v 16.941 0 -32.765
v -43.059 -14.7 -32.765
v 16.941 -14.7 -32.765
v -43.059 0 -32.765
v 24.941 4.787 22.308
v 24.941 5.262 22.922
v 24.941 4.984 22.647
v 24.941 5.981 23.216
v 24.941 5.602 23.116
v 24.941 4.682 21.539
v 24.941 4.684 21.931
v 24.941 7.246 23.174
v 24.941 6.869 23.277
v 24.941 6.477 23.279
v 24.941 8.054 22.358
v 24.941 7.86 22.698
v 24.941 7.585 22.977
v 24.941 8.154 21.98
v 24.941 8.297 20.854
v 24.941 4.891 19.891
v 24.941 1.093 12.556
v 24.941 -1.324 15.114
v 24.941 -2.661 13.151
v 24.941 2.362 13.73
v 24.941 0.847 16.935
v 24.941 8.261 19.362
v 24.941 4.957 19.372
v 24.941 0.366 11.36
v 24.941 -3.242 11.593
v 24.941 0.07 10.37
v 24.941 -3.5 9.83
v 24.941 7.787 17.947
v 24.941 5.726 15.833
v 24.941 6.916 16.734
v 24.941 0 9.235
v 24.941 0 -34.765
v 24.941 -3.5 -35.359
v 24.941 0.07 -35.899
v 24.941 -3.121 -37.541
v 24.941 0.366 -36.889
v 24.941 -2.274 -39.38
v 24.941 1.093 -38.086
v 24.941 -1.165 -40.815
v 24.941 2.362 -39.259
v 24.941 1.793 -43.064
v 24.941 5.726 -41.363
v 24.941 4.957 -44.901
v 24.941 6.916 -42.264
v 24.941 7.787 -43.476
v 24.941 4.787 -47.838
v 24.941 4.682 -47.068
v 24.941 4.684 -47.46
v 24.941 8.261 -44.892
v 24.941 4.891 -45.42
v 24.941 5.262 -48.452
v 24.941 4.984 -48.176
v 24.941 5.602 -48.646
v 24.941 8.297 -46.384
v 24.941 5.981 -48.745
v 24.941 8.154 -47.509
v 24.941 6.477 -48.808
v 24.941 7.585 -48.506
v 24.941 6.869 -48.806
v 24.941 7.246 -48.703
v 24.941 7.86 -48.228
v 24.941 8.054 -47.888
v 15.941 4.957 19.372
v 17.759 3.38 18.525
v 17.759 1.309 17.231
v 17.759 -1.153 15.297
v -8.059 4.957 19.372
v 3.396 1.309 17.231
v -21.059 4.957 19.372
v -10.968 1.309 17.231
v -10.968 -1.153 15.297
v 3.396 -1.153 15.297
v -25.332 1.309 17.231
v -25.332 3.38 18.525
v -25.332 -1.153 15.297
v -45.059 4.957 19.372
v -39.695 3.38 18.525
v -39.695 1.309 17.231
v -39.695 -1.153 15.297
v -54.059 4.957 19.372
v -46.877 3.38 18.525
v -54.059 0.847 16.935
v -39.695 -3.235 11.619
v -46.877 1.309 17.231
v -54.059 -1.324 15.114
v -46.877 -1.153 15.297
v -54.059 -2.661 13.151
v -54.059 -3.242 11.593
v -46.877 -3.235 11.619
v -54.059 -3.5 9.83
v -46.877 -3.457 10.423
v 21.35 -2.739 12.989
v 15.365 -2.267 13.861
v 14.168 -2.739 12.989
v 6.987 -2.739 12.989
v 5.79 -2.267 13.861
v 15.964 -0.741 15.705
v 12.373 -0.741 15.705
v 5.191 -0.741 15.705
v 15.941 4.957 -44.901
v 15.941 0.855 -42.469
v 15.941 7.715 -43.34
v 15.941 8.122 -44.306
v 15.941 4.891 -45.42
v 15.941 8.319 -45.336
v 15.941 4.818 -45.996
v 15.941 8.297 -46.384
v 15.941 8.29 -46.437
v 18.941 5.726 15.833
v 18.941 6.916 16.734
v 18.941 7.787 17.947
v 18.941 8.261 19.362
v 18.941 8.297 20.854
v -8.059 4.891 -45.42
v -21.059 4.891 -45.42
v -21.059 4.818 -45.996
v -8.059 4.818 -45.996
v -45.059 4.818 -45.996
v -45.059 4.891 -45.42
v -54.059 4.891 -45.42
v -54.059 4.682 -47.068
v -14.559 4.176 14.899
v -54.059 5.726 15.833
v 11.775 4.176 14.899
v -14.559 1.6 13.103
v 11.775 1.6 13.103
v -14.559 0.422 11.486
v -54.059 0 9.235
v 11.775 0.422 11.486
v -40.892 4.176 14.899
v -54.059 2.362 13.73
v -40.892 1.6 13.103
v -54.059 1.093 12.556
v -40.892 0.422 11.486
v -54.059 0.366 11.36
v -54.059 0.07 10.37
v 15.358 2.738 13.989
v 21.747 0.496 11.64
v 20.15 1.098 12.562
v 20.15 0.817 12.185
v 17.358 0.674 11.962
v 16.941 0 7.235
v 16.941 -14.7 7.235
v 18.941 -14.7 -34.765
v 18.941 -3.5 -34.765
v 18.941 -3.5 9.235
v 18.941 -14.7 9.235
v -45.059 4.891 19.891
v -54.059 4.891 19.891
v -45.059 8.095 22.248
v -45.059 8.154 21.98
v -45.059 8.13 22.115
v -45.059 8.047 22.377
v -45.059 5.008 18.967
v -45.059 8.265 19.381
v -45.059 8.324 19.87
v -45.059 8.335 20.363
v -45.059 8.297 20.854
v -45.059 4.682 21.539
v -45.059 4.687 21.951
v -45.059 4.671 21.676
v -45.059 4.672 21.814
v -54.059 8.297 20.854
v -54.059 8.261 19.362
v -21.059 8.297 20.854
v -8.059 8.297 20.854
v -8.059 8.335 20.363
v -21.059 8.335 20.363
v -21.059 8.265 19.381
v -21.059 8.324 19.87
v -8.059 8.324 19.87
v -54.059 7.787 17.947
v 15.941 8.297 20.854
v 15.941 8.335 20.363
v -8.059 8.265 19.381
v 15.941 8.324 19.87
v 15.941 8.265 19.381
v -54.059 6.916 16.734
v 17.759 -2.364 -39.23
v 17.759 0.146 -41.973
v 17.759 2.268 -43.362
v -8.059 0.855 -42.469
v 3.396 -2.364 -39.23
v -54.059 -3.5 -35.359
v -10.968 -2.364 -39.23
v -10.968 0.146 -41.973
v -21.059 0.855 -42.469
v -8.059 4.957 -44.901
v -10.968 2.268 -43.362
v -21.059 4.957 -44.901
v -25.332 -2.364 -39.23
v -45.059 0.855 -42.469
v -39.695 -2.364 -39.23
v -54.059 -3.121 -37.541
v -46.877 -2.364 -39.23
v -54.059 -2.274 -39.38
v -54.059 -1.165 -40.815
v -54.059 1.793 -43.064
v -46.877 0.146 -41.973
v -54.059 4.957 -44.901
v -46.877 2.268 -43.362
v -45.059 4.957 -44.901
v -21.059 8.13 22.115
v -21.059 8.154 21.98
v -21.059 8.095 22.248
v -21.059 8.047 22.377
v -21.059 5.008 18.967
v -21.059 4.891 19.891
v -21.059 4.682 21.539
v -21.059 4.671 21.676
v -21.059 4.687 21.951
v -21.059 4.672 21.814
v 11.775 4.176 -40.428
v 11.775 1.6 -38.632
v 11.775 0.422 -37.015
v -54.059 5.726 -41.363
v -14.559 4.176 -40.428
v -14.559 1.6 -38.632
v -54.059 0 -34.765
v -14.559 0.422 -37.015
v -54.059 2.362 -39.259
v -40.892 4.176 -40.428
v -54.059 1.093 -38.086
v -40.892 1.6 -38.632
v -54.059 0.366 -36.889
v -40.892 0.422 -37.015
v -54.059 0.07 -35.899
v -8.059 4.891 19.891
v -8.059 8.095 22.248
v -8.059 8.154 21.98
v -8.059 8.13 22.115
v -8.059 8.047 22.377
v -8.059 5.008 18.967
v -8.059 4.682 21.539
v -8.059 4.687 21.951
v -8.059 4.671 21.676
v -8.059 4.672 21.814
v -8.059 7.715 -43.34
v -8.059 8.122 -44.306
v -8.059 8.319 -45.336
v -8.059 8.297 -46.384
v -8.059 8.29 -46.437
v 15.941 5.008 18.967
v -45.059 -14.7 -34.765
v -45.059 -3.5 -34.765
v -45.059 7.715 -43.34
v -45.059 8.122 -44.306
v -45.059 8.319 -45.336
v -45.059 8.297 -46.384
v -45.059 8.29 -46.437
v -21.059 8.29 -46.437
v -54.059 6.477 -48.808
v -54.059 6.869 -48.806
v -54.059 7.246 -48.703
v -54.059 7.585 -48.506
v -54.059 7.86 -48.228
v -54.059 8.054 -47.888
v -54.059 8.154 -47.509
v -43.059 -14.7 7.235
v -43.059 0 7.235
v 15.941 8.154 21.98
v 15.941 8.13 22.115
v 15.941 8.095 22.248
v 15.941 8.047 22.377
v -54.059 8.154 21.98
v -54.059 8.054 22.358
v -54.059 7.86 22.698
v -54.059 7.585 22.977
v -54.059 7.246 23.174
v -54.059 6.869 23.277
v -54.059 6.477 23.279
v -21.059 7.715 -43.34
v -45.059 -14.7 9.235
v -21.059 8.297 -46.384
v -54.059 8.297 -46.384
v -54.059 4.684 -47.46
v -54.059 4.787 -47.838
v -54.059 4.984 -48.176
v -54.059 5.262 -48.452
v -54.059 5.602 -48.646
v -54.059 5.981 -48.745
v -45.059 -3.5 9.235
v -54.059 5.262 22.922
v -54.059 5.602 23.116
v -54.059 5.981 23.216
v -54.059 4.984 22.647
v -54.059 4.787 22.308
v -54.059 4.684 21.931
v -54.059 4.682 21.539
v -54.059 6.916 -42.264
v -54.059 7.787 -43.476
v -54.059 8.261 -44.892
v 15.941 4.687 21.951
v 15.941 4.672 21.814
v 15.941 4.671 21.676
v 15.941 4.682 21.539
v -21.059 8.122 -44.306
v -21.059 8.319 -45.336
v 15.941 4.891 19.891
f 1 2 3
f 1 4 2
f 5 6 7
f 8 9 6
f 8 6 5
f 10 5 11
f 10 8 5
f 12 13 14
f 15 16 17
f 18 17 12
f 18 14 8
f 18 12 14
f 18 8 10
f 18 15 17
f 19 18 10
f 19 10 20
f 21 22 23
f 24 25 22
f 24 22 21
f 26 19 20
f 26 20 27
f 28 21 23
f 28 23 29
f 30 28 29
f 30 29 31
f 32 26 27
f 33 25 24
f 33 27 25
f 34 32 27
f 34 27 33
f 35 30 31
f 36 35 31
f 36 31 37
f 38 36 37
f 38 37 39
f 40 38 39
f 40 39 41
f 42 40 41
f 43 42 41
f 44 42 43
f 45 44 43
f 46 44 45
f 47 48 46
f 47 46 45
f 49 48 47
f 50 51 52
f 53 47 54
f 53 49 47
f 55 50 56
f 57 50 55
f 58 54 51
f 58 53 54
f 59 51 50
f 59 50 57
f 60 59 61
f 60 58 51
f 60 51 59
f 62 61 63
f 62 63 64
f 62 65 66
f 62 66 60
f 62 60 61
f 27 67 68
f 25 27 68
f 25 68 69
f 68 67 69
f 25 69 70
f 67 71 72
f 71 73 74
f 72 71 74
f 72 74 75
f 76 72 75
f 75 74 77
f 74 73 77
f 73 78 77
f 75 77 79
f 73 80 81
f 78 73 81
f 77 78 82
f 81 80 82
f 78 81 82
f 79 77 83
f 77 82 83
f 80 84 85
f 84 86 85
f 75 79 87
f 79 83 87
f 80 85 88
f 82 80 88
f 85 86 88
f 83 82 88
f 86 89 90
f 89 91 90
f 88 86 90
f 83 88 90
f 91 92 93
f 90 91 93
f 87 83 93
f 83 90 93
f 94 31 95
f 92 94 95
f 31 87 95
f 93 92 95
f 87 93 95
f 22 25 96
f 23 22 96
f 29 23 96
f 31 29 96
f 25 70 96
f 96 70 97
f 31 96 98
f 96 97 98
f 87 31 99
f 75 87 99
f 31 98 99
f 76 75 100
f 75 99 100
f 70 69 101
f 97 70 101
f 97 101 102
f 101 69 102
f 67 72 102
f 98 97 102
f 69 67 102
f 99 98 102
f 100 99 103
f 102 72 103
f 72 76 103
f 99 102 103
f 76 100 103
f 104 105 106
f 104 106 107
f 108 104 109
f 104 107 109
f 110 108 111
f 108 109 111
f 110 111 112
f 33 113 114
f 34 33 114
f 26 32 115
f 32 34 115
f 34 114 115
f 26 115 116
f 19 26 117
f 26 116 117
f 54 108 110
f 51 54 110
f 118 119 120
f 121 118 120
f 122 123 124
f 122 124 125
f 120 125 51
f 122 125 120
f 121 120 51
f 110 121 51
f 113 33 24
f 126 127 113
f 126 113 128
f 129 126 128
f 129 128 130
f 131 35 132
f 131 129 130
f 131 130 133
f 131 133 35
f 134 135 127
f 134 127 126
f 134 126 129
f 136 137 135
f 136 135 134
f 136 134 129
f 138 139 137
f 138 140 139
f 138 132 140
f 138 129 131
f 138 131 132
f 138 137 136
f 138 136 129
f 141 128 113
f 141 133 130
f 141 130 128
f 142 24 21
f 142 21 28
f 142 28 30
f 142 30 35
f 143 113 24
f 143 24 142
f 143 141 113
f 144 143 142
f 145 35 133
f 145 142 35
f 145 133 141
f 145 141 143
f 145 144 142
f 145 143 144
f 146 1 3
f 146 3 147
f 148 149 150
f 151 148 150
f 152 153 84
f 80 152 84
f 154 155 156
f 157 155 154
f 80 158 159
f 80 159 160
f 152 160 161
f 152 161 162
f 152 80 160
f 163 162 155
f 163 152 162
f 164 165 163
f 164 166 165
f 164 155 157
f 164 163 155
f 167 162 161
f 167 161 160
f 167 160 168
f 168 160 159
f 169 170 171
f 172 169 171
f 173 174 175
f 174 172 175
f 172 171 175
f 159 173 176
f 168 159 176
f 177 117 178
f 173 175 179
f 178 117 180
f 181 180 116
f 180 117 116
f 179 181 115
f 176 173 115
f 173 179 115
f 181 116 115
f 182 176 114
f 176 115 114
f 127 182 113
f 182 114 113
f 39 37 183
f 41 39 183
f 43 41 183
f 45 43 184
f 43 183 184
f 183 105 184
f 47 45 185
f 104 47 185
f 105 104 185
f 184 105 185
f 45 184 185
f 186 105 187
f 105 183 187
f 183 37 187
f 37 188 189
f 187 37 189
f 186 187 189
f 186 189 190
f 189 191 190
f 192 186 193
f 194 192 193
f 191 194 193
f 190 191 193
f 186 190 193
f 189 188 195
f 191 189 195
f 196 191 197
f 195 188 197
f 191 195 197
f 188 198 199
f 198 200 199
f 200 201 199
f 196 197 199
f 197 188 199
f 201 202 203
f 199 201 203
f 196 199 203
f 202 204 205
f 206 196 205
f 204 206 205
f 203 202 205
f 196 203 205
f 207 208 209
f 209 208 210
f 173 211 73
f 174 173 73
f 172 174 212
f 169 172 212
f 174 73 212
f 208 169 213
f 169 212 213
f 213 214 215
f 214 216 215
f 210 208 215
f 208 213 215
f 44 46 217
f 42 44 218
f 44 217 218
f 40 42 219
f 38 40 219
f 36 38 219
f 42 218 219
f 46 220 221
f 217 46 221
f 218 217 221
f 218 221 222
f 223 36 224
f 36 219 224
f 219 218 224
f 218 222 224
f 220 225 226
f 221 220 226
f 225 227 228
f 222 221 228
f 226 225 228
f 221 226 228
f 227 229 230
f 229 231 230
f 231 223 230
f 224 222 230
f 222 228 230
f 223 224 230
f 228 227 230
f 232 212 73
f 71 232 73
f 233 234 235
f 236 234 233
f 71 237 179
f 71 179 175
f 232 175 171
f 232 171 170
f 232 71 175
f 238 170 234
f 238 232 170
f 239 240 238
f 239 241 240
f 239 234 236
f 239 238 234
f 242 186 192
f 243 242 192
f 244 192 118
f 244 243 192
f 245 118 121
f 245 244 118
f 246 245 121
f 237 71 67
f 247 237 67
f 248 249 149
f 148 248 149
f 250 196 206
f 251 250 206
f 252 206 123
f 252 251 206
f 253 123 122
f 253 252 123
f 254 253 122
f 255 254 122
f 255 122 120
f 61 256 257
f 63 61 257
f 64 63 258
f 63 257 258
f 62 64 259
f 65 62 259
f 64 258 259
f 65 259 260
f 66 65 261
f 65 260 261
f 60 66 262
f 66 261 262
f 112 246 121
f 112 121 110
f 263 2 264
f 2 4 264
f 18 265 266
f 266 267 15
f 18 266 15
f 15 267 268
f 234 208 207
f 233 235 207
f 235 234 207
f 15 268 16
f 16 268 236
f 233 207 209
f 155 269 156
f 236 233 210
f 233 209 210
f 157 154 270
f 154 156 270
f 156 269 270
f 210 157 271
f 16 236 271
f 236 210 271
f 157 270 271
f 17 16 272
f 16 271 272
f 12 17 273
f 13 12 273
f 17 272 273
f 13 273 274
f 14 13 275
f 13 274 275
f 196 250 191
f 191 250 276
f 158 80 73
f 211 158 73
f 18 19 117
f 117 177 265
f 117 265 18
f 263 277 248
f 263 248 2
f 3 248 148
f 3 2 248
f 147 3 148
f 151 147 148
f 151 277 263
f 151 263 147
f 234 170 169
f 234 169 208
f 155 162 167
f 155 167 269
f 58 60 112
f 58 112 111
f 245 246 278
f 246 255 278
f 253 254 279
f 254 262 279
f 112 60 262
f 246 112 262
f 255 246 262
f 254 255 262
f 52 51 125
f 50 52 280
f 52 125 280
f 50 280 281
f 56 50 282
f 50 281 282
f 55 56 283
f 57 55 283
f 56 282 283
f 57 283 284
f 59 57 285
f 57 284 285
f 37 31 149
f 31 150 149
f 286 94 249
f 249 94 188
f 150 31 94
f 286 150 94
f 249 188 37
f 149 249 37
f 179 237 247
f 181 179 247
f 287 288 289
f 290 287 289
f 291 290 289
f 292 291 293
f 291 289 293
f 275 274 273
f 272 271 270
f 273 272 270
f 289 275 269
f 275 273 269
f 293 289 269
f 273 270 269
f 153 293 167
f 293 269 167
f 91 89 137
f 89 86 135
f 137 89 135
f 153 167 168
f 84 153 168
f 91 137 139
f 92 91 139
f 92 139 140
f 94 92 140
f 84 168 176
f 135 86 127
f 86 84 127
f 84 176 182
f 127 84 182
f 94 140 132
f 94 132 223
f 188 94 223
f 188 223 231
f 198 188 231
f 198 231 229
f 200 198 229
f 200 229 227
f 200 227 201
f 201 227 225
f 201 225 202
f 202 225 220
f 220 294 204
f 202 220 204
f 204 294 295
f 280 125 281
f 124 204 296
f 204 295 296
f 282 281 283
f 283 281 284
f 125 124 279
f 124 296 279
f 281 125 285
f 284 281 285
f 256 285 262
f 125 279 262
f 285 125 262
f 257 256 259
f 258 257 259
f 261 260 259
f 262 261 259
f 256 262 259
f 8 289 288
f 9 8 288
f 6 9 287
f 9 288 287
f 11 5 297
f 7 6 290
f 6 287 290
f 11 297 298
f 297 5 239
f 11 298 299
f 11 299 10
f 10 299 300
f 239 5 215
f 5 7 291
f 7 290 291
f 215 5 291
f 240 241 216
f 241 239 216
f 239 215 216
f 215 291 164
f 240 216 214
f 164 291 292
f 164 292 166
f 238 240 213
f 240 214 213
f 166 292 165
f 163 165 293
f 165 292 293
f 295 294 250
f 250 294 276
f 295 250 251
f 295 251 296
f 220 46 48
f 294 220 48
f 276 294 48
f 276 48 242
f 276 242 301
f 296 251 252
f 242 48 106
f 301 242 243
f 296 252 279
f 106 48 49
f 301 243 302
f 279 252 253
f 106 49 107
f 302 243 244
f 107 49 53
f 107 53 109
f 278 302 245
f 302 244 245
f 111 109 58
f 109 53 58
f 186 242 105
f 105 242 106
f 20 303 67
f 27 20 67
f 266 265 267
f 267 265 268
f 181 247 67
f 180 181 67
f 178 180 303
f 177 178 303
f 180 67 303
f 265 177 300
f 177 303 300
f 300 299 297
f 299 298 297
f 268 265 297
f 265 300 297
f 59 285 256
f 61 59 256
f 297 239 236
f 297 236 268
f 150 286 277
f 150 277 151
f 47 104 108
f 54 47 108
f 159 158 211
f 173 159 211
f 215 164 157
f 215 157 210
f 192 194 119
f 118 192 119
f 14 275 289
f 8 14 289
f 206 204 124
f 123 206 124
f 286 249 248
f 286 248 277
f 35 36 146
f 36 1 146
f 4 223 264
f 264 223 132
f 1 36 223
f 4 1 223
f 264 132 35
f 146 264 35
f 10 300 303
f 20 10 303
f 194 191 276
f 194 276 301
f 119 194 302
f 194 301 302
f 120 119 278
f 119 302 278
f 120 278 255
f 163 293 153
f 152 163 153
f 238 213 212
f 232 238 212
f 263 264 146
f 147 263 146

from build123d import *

# Parameters (mm, degrees)
BOSS_EXTRUDE1_DEPTH      = 6
BOSS_EXTRUDE1_DEPTH_BACK = 73
SKETCH1_W                = 60
SKETCH1_H                = 40
CUT_EXTRUDE2_DEPTH       = 10
SKETCH7_W                = 64
SKETCH7_H                = 44
SKETCH7_W_2              = 60
SKETCH7_H_2              = 40
BOSS_EXTRUDE2_DEPTH      = 11.2
SKETCH5_W                = 24
SKETCH5_H                = 3
CUT_EXTRUDE3_DEPTH       = 11.2
SKETCH8_W                = 24
SKETCH8_H                = 3
CUT_EXTRUDE4_DEPTH       = 11.2
FILLET1_R                = 5


with BuildPart() as part:
    # Sketch2 → Boss-Extrude1 (new, two sides: drawn at the far end of the back side and taken through both)
    with BuildSketch(Plane(origin=(18.941176471, 0, 0), x_dir=(0, 0, -1), z_dir=(1, 0, 0)).offset(-BOSS_EXTRUDE1_DEPTH_BACK)):
        with BuildLine():
            Line((34.764705882, 0), (-9.235294118, 0))
            add(Edge.make_bspline(
                [(-16.859042356, 8.803732274), (-16.71202536, 7.645123783), (-16.476121405, 6.983025742), (-15.665438552, 5.367344471), (-15.146819104, 4.569071681), (-14.219232142, 3.103782941), (-13.097173401, 1.202110064), (-10.958273151, -0.0861532), (-9.235294118, 0)],
                knots=[0.100936793, 0.100936793, 0.100936793, 0.100936793, 0.214701658, 0.247771225, 0.411203439, 0.4591999, 0.679739374, 1, 1, 1, 1], degree=3))
            Line((-16.859042356, 8.803732274), (-20.331201871, 8.363155033))
            Line((-20.331201871, 8.363155033), (-21.979605491, 8.153991509))
            ThreePointArc((-21.979605491, 8.153991509), (-22.976524971, 7.58463131), (-23.278855037, 6.477104328))
            Line((-23.278855037, 6.477104328), (-23.215915431, 5.981081541))
            ThreePointArc((-23.215915431, 5.981081541), (-22.646555232, 4.984162061), (-21.53902825, 4.681831995))
            Line((-21.53902825, 4.681831995), (-19.89062463, 4.890995519))
            Line((-19.89062463, 4.890995519), (-19.371936566, 4.956811088))
            add(Edge.make_bspline(
                [(-19.371936566, 4.956811088), (-19.299083809, 4.805602772), (-19.143543885, 4.495535048), (-18.861030136, 3.961180263), (-18.379944727, 3.117280646), (-17.808764188, 2.238291872), (-17.267901922, 1.360604939), (-16.505554516, 0.170581495), (-15.372861084, -1.167927692), (-13.787032793, -2.419221644), (-12.034516859, -3.186353681), (-10.648338067, -3.44710609), (-10.029136817, -3.492321417), (-9.829873201, -3.5)],
                knots=[0.220066507, 0.220066507, 0.220066507, 0.220066507, 0.244323833, 0.26858116, 0.317095812, 0.414125118, 0.511154423, 0.608183729, 0.705213035, 0.80224234, 0.899271646, 0.947786298, 0.970646745, 0.970646745, 0.970646745, 0.970646745], degree=3))
            Line((-9.829873201, -3.5), (-9.158730941, -3.5))
            Line((-9.158730941, -3.5), (34.688142706, -3.5))
            Line((34.688142706, -3.5), (35.359284966, -3.5))
            add(Edge.make_bspline(
                [(35.359284966, -3.5), (35.558548581, -3.492321417), (36.177749832, -3.44710609), (37.563928624, -3.186353681), (39.316444558, -2.419221644), (40.902272849, -1.167927692), (42.034966281, 0.170581495), (42.797313687, 1.360604939), (43.338175952, 2.238291872), (43.909356491, 3.117280646), (44.390441901, 3.961180263), (44.67295565, 4.495535048), (44.828495573, 4.805602772), (44.901348331, 4.956811088)],
                knots=[0.245720713, 0.245720713, 0.245720713, 0.245720713, 0.26858116, 0.317095812, 0.414125118, 0.511154423, 0.608183729, 0.705213035, 0.80224234, 0.899271646, 0.947786298, 0.972043625, 0.996300951, 0.996300951, 0.996300951, 0.996300951], degree=3))
            Line((44.901348331, 4.956811088), (45.420036395, 4.890995519))
            Line((45.420036395, 4.890995519), (47.068440015, 4.681831995))
            ThreePointArc((47.068440015, 4.681831995), (48.175966997, 4.984162061), (48.745327196, 5.981081541))
            Line((48.745327196, 5.981081541), (48.808266802, 6.477104328))
            ThreePointArc((48.808266802, 6.477104328), (48.505936735, 7.58463131), (47.509017256, 8.153991509))
            Line((47.509017256, 8.153991509), (45.860613636, 8.363155033))
            Line((45.860613636, 8.363155033), (42.388454121, 8.803732274))
            add(Edge.make_bspline(
                [(42.388454121, 8.803732274), (42.241437125, 7.645123783), (42.00553317, 6.983025742), (41.194850317, 5.367344471), (40.676230869, 4.569071681), (39.748643907, 3.103782941), (38.626585166, 1.202110064), (36.487684916, -0.0861532), (34.764705882, 0)],
                knots=[0.100936793, 0.100936793, 0.100936793, 0.100936793, 0.214701658, 0.247771225, 0.411203439, 0.4591999, 0.679739374, 1, 1, 1, 1], degree=3))
        make_face()
    extrude(amount=BOSS_EXTRUDE1_DEPTH + BOSS_EXTRUDE1_DEPTH_BACK)

    # Sketch1 → Cut-Extrude2 (cut)
    with BuildSketch(Plane(origin=(0, 0, 0), x_dir=(1, 0, 0), z_dir=(0, 1, 0))):
        with Locations((-13.058823529, 12.764705882)):
            Rectangle(SKETCH1_W, SKETCH1_H)
    extrude(amount=-CUT_EXTRUDE2_DEPTH, mode=Mode.SUBTRACT)

    # Sketch7 → Boss-Extrude2 (add)
    with BuildSketch(Plane.XZ.offset(3.5)):
        with Locations((-13.058823529, -12.764705882)):
            Rectangle(SKETCH7_W, SKETCH7_H)
        with Locations((-13.058823529, -12.764705882)):
            Rectangle(SKETCH7_W_2, SKETCH7_H_2, mode=Mode.SUBTRACT)
    extrude(amount=BOSS_EXTRUDE2_DEPTH)

    # Sketch5 → Cut-Extrude3 (cut)
    with BuildSketch(Plane(origin=(0, 7.29739461, 0.925955726), x_dir=(1, 0, 0), z_dir=(0, -0.9920455755956746, -0.12587921171125438))):
        with Locations((-33.058823529, 19.686118423)):
            Rectangle(SKETCH5_W, SKETCH5_H)
        with Locations((3.941176471, 19.686118423)):
            Rectangle(SKETCH5_W, SKETCH5_H)
    extrude(amount=-CUT_EXTRUDE3_DEPTH, mode=Mode.SUBTRACT)

    # Sketch8 → Cut-Extrude4 (cut)
    with BuildSketch(Plane(origin=(0, 13.957613838, -1.7710612), x_dir=(1, 0, 0), z_dir=(0, 0.9920455755956736, -0.12587921171126285))):
        with Locations((-33.058823529, 43.523881917)):
            Rectangle(SKETCH8_W, SKETCH8_H)
        with Locations((3.941176471, 43.523881917)):
            Rectangle(SKETCH8_W, SKETCH8_H)
    extrude(amount=-CUT_EXTRUDE4_DEPTH, mode=Mode.SUBTRACT)

    # Fillet1
    # the kernel refuses this fillet: 5 mm, written as the material it takes off along each edge
    with BuildSketch(Plane(origin=(18.941176471, 8.803732274, -42.388454121), x_dir=(0, -0.12587921171125008, -0.9920455755956751), z_dir=(-1, 0, 0))) as fillet1_piece_1:
        with BuildLine():
            CenterArc((4.027488586, 5), FILLET1_R, 201.320916369, 68.679083631)
            Line((-0.6303042, 3.182043355), (-0.723460056, 3.145684222))
            ThreePointArc((-0.723460056, 3.145684222), (-0.228216041, 1.608856089), (-0.1, -2.43e-07))
            Line((-0.1, -2.43e-07), (0, -0.1))
            Line((0, -0.1), (4.027488586, -0.1))
            Line((4.027488586, -0.1), (4.027488586, 0))
        make_face()
    extrude(amount=83.068721464, mode=Mode.SUBTRACT)
    with BuildSketch(Plane(origin=(18.941176471, 8.803732274, 16.859042356), x_dir=(0, -0.12587921171124858, 0.9920455755956752), z_dir=(-1, 0, 0))) as fillet1_piece_2:
        with BuildLine():
            CenterArc((4.027488586, -5), FILLET1_R, 90, 68.679083631)
            Line((-0.6303042, -3.182043355), (-0.723460056, -3.145684222))
            ThreePointArc((-0.723460056, -3.145684222), (-0.228216041, -1.608856089), (-0.1, 2.43e-07))
            Line((-0.1, 2.43e-07), (0, 0.1))
            Line((0, 0.1), (4.027488586, 0.1))
            Line((4.027488586, 0.1), (4.027488586, 0))
        make_face()
    extrude(amount=83.068721464, mode=Mode.SUBTRACT)
    with BuildSketch(Plane(origin=(18.941176471, 8.803732274, 16.859042356), x_dir=(0, -0.948678952181438, -0.31624080332545423), z_dir=(1, 0, 0))) as fillet1_piece_3:
        with BuildLine():
            CenterArc((4.12213797, -4.922259934), FILLET1_R, 100.116712127, 68.679083631)
            Line((-0.782566531, -3.950728279), (-0.880660621, -3.931297646))
            Line((-0.880660621, -3.931297646), (-0.09809409, 0.019430633))
            Line((-0.09809409, 0.019430633), (0.019430395, 0.098094137))
            ThreePointArc((0.019430395, 0.098094137), (1.622536562, -0.088744475), (3.226303182, 0.098445199))
            Line((3.226303182, 0.098445199), (3.24386857, 0))
        make_face()
    extrude(amount=16.068721464, mode=Mode.SUBTRACT)
    with BuildSketch(Plane(origin=(18.941176471, 8.803732274, -42.388454121), x_dir=(0, -0.12587921171125008, -0.9920455755956751), z_dir=(1, 0, 0))) as fillet1_piece_4:
        with BuildLine():
            CenterArc((4.027488586, -5), FILLET1_R, 90, 68.679083631)
            Line((-0.6303042, -3.182043355), (-0.723460056, -3.145684222))
            ThreePointArc((-0.723460056, -3.145684222), (-0.228216041, -1.608856089), (-0.1, 2.43e-07))
            Line((-0.1, 2.43e-07), (0, 0.1))
            Line((0, 0.1), (4.027488586, 0.1))
            Line((4.027488586, 0.1), (4.027488586, 0))
        make_face()
    extrude(amount=16.068721464, mode=Mode.SUBTRACT)


solid = part.part
